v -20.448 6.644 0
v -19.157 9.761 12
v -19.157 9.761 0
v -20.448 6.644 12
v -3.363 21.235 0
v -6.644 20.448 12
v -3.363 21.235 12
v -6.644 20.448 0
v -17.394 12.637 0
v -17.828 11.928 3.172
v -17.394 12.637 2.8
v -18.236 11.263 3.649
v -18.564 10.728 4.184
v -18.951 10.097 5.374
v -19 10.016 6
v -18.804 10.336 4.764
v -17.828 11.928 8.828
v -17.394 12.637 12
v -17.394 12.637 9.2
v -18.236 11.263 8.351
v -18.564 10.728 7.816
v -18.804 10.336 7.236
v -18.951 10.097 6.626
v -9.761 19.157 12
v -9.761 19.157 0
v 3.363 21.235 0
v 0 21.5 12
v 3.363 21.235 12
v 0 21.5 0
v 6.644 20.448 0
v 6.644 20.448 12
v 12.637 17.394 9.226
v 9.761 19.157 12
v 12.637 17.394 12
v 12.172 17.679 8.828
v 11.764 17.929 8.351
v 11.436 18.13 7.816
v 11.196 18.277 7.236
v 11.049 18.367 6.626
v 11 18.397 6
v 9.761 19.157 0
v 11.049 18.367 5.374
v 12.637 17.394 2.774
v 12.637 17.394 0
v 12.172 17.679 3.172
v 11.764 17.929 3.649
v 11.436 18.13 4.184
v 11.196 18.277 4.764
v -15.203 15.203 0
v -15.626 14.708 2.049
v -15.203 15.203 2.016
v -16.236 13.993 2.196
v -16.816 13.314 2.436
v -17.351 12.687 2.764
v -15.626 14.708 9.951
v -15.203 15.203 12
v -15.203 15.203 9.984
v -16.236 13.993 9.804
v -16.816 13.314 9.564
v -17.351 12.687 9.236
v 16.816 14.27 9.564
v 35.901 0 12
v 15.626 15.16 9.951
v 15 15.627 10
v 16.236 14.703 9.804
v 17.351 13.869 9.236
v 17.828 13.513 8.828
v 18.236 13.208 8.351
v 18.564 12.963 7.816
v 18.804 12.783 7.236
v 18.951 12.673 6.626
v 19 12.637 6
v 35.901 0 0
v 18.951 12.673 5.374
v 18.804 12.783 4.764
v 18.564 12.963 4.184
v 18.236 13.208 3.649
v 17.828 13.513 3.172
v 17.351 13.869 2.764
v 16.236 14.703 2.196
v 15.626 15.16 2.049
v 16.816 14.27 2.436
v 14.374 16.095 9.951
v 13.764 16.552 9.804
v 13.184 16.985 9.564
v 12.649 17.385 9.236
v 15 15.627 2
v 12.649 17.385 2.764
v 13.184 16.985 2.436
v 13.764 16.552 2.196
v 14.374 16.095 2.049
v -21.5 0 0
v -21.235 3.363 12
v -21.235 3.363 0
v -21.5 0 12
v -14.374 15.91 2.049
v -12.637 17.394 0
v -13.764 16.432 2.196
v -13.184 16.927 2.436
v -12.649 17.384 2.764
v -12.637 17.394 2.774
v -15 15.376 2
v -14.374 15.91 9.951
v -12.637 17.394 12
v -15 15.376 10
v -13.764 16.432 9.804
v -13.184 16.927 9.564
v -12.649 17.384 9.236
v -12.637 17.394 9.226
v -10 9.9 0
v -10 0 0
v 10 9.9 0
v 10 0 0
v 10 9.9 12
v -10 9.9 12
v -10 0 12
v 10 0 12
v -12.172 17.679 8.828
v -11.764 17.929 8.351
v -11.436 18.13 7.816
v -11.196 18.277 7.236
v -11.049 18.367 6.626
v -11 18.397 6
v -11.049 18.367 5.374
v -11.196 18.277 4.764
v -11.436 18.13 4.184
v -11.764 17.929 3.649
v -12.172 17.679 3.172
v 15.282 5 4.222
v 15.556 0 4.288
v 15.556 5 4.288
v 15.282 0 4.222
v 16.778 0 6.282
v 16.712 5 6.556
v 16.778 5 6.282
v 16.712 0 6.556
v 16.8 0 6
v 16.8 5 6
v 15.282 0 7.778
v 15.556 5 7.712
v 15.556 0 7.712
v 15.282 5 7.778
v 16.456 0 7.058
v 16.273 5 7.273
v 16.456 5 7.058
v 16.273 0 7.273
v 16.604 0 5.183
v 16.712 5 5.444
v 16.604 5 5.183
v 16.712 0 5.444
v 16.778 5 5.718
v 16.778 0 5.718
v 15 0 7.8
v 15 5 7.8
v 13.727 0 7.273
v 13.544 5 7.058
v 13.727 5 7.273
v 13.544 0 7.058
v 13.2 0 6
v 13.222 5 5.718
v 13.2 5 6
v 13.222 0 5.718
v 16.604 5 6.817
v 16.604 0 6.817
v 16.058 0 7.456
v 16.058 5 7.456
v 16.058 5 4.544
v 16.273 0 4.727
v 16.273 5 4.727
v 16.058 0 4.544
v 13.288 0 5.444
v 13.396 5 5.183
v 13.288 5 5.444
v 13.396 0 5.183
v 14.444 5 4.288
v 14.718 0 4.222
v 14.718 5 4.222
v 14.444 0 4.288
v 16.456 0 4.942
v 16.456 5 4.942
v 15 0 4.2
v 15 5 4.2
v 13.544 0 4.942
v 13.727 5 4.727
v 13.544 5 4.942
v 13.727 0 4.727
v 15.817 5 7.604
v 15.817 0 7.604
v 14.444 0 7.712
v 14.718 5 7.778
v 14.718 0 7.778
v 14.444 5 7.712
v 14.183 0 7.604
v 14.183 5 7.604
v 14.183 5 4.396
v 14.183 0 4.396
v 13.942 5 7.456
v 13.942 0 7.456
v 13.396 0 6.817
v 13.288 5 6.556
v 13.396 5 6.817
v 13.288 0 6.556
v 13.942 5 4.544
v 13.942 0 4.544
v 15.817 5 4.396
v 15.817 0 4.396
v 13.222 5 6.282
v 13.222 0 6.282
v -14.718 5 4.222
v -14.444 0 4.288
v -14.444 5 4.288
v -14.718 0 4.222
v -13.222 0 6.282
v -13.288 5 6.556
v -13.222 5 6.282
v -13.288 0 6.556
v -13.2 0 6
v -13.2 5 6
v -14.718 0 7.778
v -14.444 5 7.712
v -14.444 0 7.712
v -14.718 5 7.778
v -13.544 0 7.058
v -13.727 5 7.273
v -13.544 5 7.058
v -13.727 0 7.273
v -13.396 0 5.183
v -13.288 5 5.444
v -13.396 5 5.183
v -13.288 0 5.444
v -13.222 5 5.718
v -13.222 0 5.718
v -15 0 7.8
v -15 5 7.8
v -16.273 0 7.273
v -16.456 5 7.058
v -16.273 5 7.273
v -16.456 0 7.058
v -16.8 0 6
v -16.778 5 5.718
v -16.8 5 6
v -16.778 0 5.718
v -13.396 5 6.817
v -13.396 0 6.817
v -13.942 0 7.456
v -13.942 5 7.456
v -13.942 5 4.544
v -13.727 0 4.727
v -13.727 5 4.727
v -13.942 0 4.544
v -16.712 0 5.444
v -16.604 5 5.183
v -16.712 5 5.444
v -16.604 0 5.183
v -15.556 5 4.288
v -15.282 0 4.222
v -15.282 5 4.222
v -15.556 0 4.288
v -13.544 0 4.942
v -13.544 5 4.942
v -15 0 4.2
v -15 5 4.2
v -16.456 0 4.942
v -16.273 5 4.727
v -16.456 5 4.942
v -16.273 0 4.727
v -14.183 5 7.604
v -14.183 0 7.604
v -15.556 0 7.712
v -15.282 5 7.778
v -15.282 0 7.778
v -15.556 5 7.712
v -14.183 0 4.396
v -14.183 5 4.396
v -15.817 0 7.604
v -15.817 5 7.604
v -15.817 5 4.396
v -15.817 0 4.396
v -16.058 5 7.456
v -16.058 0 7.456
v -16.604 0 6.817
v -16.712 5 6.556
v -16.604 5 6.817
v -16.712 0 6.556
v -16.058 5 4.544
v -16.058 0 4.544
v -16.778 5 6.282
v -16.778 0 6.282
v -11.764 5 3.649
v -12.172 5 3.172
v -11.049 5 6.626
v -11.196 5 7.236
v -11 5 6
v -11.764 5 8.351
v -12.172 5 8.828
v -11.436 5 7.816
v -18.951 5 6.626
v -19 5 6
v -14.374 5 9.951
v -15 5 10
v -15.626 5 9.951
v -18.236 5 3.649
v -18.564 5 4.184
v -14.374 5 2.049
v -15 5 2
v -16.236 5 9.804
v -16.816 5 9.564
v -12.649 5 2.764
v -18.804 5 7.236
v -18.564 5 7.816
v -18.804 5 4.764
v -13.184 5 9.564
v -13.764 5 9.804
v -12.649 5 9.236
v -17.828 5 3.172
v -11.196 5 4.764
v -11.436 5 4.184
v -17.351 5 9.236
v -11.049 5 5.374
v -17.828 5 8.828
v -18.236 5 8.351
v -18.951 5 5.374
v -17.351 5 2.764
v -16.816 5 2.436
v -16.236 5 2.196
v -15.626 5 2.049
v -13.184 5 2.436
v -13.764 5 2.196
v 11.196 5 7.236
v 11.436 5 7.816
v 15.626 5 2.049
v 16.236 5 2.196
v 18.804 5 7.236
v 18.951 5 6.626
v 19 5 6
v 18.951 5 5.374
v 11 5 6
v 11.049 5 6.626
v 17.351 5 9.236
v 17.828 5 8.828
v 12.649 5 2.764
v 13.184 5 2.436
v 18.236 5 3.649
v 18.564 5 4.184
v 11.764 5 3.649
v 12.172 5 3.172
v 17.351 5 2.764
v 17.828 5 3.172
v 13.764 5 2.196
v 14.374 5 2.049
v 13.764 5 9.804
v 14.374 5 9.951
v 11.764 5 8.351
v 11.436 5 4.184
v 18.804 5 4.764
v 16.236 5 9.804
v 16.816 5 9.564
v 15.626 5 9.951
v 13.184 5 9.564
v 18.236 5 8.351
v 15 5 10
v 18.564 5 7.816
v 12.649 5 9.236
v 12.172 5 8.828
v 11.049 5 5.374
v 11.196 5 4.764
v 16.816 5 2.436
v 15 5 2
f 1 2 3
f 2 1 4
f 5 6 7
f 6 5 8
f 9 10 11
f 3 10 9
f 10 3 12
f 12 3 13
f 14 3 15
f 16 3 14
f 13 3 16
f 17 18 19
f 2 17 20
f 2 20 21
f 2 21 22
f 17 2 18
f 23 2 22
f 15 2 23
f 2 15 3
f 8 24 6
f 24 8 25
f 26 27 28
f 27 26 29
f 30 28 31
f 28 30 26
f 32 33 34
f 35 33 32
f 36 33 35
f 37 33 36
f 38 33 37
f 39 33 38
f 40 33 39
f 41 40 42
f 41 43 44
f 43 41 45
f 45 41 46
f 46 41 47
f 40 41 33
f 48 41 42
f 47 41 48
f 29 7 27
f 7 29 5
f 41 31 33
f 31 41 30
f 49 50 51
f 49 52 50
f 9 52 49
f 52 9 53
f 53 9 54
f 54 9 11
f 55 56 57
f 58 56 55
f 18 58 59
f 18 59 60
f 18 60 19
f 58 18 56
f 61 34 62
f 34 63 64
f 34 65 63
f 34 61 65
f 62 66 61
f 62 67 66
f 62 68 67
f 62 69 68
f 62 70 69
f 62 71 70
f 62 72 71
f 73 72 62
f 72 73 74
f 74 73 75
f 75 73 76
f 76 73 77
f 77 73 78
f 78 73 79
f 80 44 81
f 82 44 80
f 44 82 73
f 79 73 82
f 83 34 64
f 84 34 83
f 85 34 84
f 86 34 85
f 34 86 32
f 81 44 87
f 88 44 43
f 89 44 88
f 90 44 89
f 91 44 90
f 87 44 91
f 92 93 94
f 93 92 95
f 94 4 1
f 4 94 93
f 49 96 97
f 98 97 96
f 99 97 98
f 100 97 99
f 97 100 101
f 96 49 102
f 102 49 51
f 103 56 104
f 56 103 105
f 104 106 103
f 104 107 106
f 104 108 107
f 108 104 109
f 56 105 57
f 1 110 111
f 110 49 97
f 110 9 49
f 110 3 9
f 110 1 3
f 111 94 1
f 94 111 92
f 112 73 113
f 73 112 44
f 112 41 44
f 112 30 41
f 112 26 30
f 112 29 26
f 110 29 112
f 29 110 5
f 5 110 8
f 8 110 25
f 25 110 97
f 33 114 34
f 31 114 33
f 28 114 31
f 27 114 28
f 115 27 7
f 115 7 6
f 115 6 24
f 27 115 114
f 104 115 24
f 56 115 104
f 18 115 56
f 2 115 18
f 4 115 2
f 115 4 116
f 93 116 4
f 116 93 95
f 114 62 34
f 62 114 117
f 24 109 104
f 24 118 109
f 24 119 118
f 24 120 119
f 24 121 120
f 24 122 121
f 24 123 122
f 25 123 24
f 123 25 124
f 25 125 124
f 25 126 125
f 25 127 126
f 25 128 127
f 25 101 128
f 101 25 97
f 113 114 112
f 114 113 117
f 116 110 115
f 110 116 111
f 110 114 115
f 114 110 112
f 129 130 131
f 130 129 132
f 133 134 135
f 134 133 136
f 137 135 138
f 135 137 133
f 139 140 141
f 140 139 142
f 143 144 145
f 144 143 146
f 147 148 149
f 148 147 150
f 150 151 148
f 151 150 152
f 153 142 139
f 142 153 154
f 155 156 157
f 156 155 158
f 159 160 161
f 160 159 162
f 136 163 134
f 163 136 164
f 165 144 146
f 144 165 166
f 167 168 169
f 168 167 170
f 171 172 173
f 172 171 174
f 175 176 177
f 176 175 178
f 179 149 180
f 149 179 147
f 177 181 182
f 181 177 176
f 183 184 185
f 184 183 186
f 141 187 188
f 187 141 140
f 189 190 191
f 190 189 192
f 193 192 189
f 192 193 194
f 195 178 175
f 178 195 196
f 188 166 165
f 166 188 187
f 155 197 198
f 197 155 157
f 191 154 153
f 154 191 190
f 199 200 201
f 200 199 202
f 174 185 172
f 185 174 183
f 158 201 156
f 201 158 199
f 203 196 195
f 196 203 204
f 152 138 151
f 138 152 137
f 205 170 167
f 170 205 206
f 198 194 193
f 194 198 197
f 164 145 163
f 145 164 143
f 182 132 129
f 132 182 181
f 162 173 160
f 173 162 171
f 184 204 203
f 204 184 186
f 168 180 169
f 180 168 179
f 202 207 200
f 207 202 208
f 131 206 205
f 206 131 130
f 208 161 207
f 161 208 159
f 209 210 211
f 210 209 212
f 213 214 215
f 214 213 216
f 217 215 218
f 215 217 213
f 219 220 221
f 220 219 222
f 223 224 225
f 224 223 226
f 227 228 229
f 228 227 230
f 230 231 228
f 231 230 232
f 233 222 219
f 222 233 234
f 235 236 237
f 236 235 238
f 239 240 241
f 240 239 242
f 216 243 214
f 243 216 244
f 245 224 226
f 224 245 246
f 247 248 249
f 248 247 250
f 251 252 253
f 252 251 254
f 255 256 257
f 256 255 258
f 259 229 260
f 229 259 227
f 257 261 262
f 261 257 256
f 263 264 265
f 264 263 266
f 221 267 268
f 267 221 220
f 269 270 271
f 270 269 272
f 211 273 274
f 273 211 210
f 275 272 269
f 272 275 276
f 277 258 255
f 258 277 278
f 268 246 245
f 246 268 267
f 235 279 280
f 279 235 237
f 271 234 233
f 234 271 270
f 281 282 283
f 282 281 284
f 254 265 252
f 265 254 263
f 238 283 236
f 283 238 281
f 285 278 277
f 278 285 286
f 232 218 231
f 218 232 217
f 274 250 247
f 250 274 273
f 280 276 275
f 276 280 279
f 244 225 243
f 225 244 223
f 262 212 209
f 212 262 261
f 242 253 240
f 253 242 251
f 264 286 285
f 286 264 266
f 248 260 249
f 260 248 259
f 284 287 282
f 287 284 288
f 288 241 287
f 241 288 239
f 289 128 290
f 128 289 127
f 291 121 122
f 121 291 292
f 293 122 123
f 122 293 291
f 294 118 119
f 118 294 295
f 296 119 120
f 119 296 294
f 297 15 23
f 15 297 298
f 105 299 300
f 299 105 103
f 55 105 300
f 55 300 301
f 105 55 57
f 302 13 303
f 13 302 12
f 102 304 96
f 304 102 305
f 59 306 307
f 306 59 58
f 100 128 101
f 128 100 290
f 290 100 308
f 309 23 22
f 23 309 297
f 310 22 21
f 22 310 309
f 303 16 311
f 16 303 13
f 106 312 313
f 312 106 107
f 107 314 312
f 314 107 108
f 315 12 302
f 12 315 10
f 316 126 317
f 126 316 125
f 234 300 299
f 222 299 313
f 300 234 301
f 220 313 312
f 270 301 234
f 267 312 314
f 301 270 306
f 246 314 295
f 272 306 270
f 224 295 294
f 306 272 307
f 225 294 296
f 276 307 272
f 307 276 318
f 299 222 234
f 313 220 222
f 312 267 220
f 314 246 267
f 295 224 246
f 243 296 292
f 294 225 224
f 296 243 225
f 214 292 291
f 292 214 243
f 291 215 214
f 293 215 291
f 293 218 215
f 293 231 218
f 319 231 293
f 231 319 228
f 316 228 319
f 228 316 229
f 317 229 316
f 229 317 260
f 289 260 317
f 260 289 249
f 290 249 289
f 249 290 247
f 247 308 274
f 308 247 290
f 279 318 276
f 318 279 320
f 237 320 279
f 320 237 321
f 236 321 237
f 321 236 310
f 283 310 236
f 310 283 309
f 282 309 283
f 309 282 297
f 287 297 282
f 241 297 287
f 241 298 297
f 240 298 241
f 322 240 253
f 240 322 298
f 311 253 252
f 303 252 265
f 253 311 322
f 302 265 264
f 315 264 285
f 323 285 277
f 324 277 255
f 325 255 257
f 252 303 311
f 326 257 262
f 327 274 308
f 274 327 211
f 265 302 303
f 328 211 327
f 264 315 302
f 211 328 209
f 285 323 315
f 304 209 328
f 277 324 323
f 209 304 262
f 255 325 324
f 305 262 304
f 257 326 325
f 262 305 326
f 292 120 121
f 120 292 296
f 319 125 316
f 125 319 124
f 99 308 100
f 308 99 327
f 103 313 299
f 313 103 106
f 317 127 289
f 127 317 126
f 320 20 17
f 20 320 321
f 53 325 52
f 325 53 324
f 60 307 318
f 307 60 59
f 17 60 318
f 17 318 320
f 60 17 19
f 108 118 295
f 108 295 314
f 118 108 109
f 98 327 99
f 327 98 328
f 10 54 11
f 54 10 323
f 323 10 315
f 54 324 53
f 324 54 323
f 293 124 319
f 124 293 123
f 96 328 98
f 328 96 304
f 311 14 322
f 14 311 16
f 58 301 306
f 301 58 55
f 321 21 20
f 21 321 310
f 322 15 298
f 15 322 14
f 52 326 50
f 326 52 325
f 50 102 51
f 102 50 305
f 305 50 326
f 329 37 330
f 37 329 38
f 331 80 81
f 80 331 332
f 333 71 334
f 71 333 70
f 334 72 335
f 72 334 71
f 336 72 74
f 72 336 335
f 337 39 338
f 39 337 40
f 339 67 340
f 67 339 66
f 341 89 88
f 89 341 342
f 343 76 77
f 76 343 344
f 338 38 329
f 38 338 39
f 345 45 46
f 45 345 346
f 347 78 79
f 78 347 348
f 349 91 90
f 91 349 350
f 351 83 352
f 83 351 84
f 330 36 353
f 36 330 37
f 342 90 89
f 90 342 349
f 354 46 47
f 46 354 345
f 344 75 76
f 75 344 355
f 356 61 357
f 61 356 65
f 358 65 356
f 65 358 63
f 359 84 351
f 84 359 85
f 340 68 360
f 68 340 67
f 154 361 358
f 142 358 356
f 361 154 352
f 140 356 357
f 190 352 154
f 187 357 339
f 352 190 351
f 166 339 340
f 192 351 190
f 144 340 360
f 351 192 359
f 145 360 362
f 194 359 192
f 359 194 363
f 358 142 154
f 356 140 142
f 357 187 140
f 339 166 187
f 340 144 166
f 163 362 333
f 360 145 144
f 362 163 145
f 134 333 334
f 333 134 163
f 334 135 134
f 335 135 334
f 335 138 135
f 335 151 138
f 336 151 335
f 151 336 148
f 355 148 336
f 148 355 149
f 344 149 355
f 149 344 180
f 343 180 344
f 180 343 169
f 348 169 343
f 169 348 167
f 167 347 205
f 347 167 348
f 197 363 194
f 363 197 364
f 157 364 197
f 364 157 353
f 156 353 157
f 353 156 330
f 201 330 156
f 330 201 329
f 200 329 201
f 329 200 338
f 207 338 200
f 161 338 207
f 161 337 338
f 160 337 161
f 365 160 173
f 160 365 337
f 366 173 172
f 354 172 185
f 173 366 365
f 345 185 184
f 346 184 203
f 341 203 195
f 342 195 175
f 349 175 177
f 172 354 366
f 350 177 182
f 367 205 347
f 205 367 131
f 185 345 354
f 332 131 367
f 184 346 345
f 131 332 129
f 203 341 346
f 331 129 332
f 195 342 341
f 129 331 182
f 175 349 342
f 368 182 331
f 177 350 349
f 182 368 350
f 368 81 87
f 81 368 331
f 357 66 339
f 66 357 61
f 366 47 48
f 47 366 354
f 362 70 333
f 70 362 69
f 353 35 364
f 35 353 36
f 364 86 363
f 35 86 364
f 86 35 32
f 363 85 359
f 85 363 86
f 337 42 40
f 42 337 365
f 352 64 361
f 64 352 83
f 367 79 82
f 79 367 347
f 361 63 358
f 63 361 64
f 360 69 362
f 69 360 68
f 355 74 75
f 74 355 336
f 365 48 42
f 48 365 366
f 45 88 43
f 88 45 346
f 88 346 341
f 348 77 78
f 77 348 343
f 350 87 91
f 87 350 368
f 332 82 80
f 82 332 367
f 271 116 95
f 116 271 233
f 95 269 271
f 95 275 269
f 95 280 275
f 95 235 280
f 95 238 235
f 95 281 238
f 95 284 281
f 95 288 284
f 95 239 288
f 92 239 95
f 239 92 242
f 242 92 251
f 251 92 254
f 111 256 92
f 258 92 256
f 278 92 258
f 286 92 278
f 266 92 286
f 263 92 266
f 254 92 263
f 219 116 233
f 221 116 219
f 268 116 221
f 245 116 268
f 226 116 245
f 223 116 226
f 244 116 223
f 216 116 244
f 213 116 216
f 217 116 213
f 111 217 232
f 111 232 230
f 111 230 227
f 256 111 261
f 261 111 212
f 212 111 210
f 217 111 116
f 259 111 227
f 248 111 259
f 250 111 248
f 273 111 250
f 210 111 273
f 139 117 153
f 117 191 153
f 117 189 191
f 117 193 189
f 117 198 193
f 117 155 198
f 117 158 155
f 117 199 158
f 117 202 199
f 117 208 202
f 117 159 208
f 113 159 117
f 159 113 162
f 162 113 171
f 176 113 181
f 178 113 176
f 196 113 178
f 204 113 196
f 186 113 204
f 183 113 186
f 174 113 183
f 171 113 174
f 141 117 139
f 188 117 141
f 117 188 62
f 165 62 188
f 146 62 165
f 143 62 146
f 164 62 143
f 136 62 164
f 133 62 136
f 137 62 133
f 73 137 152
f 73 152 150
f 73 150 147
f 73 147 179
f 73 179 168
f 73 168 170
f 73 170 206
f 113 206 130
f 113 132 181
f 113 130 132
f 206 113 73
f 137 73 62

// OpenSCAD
//translate([50,0,+20])rotate([0,180,0])color("red")import("motor_nema17.stl");

difference(){
hull(){
translate([0,0,0])cylinder(r=43/2, h=12, $fn=40);
translate([30,-58/2,0])cube([38,5,12]);
}
translate([-20.0/2,-19.8/2,-1])cube([20.0,19.8,72]);  

translate([50,+70/2,6])rotate([90,0,0])cylinder(r=2, h=70, $fn=40);
translate([60,+70/2,6])rotate([90,0,0])cylinder(r=2, h=70, $fn=40);
translate([40,+70/2,6])rotate([90,0,0])cylinder(r=2, h=70, $fn=40);

translate([50,+70/2+15,6])rotate([90,0,0])cylinder(r=4, h=70, $fn=40);
translate([60,+70/2+15,6])rotate([90,0,0])cylinder(r=4, h=70, $fn=40);
translate([40,+70/2+15,6])rotate([90,0,0])cylinder(r=4, h=70, $fn=40);

translate([15,+70/2,6])rotate([90,0,0])cylinder(r=1.8, h=70, $fn=40);
translate([-15,+70/2,6])rotate([90,0,0])cylinder(r=1.8, h=70, $fn=40);

translate([-15,-5,6])rotate([90,0,0])cylinder(r=4, h=70, $fn=40);
translate([-15,70+5,6])rotate([90,0,0])cylinder(r=4, h=70, $fn=40);

translate([15,-5,6])rotate([90,0,0])cylinder(r=4, h=70, $fn=40);
translate([15,70+5,6])rotate([90,0,0])cylinder(r=4, h=70, $fn=40);


//translate([-30,0,-2])cube([120,100,42]); // Comment for low
translate([-30,-100,-2])cube([120,100,42]); // Comment for up

}
